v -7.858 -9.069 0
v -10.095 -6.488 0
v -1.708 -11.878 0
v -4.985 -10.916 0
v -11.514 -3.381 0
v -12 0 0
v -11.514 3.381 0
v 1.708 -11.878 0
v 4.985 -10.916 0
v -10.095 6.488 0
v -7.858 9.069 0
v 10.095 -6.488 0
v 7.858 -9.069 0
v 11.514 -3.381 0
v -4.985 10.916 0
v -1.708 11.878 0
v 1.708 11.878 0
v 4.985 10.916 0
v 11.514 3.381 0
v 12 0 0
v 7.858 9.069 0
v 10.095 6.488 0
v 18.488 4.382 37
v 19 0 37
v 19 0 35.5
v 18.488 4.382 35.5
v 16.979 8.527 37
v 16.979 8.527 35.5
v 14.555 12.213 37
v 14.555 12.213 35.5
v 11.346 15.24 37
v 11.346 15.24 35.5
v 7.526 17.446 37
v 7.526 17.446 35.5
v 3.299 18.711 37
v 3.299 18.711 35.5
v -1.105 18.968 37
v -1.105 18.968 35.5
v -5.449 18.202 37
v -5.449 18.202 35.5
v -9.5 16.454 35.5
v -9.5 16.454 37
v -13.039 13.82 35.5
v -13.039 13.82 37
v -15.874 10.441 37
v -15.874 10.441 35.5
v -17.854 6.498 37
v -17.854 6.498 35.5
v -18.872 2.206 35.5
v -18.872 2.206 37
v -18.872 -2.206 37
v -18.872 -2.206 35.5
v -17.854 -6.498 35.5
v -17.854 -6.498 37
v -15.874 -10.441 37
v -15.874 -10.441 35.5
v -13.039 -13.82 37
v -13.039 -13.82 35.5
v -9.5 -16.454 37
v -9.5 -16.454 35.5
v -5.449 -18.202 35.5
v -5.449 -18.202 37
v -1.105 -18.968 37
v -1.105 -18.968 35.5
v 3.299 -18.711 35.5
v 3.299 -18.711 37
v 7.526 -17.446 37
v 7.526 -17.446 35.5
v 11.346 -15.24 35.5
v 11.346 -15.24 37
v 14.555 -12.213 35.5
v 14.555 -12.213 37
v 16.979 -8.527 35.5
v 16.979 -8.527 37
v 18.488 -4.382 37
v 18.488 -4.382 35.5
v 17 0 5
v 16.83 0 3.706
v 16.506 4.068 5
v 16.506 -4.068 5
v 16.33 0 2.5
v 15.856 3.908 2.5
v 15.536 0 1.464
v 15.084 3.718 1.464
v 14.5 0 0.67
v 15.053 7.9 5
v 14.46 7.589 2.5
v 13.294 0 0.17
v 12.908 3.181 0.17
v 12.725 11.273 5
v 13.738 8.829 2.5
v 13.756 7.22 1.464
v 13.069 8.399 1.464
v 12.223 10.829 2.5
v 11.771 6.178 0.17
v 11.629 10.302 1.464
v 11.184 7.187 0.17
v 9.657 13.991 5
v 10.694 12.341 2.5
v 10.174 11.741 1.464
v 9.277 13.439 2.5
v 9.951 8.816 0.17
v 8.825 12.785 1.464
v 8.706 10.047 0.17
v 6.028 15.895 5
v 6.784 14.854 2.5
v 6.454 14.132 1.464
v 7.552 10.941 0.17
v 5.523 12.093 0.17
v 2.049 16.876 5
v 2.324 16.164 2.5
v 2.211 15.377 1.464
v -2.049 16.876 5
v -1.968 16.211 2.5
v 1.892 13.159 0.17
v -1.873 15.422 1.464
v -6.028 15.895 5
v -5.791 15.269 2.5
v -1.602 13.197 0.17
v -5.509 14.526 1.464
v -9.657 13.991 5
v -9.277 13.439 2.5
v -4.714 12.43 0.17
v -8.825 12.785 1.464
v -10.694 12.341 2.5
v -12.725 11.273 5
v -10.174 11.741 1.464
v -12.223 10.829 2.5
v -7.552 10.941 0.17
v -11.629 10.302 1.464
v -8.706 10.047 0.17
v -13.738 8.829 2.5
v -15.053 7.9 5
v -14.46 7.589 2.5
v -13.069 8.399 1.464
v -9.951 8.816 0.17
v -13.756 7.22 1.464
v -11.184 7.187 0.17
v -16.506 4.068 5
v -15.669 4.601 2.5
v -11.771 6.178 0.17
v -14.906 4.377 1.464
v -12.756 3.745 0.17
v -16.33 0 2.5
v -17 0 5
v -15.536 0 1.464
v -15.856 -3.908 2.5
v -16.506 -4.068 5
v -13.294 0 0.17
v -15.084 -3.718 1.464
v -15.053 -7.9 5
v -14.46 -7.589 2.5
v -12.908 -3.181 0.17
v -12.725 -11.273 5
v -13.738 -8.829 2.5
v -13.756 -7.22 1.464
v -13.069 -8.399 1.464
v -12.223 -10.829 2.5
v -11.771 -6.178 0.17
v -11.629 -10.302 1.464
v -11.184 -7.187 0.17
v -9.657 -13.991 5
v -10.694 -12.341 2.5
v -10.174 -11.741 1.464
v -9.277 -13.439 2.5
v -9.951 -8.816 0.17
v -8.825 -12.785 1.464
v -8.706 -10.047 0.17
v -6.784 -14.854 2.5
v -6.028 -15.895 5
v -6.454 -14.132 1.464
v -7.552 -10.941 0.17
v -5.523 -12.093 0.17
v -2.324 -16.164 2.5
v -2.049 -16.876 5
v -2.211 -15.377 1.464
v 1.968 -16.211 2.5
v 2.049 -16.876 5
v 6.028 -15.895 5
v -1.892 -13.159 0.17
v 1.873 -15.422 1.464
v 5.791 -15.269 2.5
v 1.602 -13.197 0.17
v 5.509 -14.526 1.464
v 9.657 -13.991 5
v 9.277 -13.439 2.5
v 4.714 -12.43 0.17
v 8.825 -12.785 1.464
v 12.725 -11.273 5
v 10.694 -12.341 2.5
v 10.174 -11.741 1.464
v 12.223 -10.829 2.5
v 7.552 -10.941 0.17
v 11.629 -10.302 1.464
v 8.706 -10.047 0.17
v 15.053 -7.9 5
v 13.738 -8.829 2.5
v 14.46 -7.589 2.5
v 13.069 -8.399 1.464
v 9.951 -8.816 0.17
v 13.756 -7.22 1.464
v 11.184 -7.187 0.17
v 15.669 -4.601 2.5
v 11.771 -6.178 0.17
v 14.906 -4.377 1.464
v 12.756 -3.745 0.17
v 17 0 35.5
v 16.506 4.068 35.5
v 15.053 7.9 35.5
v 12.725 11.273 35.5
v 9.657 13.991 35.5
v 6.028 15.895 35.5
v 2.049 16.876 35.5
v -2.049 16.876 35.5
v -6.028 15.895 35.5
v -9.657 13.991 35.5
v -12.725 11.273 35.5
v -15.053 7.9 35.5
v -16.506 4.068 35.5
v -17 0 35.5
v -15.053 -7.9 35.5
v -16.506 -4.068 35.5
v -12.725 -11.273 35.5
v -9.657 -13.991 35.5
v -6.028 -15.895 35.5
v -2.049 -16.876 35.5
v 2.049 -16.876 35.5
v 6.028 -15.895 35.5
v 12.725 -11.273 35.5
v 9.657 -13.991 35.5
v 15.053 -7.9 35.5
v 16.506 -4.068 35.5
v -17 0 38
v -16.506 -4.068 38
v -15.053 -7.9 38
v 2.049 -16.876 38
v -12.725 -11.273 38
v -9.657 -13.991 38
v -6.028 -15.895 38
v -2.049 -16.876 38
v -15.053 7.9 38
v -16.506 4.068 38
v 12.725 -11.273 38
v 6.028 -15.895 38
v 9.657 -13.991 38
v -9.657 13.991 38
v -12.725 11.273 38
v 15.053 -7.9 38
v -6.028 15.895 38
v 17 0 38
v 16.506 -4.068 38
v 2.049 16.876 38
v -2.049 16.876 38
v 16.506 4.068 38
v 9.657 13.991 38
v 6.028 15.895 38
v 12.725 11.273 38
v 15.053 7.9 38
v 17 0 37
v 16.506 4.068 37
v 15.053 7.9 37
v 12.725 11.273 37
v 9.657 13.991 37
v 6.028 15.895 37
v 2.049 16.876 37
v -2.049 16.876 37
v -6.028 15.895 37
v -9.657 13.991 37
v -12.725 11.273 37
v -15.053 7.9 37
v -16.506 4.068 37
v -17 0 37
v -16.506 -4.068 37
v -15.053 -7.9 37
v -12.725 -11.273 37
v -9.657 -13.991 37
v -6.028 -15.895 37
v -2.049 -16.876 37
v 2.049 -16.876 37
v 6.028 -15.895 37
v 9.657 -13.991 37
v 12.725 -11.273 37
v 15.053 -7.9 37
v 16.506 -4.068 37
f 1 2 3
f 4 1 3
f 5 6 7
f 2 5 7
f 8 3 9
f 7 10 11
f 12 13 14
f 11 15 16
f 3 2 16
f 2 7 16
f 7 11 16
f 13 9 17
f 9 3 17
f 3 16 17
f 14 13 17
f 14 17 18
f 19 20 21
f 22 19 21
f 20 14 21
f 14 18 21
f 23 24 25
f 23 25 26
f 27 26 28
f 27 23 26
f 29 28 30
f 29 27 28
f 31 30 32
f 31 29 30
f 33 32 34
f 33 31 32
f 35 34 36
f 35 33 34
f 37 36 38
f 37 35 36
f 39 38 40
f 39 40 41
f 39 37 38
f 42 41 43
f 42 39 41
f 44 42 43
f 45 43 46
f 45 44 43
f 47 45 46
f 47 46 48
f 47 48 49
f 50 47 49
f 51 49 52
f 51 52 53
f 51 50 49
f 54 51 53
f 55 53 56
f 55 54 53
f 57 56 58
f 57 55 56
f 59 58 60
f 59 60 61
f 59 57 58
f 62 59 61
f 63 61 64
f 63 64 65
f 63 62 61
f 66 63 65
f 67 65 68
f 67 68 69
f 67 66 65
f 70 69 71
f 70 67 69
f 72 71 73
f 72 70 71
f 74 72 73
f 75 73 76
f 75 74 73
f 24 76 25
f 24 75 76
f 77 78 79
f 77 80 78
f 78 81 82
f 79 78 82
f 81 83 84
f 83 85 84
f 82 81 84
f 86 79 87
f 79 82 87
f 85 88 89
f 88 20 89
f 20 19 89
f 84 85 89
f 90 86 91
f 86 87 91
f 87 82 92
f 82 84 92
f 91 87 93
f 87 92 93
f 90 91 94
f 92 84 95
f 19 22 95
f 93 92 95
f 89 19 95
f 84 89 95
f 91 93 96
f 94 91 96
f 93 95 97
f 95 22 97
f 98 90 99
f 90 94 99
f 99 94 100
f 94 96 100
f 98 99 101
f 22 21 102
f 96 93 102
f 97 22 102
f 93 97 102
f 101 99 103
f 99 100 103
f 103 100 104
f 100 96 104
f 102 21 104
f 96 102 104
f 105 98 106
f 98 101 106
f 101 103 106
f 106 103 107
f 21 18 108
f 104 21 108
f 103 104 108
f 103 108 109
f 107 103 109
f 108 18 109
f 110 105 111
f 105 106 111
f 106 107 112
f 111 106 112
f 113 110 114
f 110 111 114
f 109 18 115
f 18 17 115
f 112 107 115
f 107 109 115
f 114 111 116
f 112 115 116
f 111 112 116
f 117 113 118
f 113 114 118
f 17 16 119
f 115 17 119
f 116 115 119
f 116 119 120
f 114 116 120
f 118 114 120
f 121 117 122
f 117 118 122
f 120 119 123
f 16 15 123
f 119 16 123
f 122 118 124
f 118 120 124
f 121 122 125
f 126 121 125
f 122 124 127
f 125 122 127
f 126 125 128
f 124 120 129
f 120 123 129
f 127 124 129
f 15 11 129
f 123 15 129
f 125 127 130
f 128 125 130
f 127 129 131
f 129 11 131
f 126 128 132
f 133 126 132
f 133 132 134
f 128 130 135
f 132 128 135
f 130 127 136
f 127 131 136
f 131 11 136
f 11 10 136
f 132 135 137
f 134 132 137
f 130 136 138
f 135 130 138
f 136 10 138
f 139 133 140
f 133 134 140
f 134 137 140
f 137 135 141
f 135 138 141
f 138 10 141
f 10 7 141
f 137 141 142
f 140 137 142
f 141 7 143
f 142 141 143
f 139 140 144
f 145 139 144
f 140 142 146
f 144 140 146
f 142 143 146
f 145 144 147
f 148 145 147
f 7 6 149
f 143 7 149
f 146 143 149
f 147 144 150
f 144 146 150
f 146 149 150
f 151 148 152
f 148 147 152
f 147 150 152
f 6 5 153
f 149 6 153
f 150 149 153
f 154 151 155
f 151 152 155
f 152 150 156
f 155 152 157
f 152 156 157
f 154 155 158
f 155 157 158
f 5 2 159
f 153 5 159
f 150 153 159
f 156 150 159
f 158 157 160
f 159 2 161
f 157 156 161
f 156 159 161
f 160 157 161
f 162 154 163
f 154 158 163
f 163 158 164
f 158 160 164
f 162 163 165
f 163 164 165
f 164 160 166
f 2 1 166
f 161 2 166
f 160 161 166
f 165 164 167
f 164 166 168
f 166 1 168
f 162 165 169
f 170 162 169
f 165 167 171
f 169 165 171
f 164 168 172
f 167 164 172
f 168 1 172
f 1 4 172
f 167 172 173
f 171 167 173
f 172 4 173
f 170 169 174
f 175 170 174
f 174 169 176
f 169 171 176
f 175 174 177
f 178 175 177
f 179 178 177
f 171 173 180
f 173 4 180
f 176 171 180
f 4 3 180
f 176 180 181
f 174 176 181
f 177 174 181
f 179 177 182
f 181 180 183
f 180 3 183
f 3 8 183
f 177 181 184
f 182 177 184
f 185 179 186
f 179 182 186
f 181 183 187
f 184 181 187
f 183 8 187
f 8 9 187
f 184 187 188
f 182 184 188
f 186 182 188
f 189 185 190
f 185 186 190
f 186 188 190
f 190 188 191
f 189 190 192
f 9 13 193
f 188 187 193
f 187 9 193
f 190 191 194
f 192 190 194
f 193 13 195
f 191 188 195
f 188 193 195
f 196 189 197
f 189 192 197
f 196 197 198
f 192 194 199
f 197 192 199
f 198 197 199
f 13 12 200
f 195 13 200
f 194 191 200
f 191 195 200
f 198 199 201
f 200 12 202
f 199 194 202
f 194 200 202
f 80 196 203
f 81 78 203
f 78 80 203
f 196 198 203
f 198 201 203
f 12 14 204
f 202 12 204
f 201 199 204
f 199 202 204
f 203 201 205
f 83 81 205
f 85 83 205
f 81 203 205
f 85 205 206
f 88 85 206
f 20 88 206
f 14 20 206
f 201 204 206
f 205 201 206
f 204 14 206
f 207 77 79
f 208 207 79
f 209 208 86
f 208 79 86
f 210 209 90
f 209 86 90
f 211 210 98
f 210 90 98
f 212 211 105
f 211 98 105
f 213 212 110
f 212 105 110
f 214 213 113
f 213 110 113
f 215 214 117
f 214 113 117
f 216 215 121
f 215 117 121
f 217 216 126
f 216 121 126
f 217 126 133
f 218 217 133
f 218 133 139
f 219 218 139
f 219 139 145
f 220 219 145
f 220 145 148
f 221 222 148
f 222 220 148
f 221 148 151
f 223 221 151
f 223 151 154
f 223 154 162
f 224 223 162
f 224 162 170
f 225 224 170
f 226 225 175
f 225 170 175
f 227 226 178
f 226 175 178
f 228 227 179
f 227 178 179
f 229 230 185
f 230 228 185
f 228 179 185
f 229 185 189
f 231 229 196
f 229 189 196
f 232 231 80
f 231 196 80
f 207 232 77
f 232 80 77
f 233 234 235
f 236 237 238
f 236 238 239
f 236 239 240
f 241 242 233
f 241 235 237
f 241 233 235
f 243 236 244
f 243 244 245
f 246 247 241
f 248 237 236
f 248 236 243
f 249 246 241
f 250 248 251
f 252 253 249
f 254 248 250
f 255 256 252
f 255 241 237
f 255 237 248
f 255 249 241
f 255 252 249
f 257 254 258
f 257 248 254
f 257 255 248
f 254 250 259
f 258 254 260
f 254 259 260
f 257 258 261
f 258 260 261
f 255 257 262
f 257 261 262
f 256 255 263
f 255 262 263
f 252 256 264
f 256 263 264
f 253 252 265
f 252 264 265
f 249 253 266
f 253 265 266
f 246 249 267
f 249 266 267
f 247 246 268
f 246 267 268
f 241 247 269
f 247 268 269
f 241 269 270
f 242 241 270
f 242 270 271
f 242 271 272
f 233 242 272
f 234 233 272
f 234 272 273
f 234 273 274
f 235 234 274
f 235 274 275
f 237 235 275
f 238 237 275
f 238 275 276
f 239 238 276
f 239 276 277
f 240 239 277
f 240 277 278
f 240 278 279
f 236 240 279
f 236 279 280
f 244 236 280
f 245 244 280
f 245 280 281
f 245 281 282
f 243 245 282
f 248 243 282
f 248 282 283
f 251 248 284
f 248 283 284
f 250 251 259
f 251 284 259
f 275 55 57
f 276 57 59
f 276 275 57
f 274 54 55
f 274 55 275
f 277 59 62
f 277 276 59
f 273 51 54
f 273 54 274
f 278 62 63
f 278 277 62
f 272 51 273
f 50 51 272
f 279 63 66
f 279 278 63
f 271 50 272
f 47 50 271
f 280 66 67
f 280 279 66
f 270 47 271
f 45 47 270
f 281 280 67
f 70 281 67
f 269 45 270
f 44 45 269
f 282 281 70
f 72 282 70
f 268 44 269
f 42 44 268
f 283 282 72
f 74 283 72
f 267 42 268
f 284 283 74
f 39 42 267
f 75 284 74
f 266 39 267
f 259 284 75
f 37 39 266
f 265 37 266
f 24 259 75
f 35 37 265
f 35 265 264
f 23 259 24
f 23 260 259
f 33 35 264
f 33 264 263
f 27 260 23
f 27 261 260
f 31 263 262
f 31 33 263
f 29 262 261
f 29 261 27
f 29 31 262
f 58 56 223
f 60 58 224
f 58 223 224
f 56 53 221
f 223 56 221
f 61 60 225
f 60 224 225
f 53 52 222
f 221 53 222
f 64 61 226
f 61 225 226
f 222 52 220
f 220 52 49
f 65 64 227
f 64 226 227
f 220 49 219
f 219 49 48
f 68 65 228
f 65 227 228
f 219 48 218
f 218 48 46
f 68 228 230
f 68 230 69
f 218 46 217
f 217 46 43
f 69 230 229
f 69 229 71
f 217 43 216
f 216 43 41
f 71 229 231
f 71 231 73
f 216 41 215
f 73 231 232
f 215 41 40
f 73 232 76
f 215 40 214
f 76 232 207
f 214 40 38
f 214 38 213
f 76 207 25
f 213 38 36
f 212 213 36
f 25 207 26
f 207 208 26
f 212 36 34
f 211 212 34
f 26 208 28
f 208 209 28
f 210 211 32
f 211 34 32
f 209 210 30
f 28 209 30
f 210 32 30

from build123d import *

# Parameters (mm, degrees)
F0_R     = 17
F1_DEPTH = 38
F2_R     = 5
F4_R     = 19
F5_DEPTH = 1.5


with BuildPart() as f1:
    # F0 (on Top) → F1 (new body)
    with BuildSketch(Plane.XY):
        Circle(F0_R)
    extrude(amount=F1_DEPTH)

    # F2
    f2_edges = [f1.edges().sort_by_distance(p)[0] for p in [
        (-17, 0, 0),
    ]]
    fillet(f2_edges, radius=F2_R)

    # F4 (on offset) → F5 (join)
    with BuildSketch(Plane.XY.offset(37)):
        Circle(F4_R)
    extrude(amount=-F5_DEPTH)


solid = f1.part
